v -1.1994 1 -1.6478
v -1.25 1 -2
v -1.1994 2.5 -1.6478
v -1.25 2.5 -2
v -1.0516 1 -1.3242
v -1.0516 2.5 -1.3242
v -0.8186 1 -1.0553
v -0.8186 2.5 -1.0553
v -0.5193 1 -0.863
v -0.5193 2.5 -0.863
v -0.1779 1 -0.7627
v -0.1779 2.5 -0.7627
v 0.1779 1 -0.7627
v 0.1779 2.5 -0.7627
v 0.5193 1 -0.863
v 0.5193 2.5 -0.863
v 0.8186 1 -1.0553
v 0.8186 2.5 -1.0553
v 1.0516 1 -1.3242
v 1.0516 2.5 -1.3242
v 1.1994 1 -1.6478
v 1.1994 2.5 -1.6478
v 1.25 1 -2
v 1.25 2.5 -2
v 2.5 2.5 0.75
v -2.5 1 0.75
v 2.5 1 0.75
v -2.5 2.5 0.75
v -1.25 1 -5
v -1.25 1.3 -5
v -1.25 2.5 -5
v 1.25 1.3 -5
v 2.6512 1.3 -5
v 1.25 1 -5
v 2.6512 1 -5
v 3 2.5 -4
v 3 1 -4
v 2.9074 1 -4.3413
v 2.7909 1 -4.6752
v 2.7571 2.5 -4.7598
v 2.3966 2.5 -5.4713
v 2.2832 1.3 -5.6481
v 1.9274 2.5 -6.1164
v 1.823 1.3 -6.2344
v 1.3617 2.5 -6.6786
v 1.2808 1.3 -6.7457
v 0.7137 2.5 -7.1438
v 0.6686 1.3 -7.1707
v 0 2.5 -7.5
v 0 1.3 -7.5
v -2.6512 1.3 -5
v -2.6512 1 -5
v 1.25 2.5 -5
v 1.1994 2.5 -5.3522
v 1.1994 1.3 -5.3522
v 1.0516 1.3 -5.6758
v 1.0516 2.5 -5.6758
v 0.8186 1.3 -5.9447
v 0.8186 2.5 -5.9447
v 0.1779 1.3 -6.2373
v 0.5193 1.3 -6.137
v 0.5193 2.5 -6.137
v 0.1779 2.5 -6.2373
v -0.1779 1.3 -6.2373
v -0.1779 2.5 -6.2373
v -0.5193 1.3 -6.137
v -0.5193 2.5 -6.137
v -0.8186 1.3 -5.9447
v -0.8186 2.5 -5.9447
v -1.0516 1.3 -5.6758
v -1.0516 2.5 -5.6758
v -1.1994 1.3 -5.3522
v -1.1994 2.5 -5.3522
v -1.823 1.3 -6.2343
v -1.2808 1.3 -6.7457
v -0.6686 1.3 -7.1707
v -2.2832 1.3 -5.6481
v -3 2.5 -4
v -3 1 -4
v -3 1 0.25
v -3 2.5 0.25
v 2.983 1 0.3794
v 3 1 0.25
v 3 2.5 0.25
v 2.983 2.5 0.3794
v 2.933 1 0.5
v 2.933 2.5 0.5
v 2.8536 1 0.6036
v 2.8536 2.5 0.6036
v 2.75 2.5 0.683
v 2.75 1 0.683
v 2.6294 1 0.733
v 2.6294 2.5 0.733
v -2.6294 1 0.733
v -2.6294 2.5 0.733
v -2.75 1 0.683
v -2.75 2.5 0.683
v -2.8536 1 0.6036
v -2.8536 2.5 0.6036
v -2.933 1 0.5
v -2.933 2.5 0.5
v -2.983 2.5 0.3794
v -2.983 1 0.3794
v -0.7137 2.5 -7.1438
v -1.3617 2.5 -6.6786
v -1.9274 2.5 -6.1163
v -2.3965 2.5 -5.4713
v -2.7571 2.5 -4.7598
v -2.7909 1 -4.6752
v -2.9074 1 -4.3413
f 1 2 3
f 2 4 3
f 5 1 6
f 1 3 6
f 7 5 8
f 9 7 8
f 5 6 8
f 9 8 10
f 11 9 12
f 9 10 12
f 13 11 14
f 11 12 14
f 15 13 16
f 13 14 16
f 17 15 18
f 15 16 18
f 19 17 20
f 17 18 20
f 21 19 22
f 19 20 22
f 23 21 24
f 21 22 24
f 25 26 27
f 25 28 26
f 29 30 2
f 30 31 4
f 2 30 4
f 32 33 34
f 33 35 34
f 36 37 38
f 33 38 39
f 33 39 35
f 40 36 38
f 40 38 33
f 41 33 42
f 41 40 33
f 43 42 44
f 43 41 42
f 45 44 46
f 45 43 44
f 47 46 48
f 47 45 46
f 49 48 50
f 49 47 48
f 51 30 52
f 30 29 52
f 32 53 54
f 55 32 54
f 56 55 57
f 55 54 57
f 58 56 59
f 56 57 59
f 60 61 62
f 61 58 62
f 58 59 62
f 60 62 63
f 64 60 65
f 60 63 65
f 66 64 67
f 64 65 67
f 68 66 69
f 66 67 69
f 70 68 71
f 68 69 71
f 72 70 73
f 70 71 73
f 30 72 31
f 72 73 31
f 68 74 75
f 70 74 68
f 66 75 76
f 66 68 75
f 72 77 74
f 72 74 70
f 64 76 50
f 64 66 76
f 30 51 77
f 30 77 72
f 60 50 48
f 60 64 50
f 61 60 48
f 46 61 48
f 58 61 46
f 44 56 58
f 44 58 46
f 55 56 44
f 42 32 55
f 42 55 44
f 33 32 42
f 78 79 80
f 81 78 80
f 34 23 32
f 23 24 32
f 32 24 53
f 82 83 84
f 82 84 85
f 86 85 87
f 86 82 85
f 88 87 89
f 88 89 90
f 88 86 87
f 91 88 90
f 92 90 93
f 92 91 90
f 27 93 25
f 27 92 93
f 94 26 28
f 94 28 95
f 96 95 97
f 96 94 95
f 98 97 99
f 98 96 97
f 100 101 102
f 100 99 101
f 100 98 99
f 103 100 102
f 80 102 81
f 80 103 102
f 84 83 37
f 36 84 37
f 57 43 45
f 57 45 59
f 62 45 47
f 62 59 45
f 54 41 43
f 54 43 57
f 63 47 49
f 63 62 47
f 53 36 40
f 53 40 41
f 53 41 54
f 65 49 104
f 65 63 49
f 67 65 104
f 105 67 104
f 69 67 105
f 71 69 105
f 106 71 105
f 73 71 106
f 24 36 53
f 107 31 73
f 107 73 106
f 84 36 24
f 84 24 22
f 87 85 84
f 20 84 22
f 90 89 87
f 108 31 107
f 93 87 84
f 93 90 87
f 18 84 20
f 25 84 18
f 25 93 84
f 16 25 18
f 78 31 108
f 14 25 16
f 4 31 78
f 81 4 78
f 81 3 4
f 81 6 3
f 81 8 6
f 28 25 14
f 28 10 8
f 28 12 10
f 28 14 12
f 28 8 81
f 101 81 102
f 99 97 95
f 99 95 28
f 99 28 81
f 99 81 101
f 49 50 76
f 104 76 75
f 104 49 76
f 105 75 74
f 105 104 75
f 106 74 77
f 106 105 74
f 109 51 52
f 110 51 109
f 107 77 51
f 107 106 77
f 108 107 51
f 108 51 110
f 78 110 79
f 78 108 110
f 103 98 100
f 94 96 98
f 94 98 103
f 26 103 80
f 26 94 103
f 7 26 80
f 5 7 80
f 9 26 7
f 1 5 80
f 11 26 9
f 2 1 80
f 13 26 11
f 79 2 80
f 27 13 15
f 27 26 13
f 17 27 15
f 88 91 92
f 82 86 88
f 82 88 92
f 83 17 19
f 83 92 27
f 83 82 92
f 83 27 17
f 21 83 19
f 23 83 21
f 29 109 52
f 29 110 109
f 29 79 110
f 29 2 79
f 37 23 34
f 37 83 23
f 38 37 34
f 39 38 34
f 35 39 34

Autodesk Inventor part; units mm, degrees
ref_plane "YZ Plane" through (0, 0, 0) normal (1, 0, 0) x (0, 1, 0)
ref_plane "XZ Plane" through (0, 0, 0) normal (0, 1, 0) x (-1, 0, 0)
ref_plane "XY Plane" through (0, 0, 0) normal (0, 0, 1) x (1, 0, 0)
sketch "Sketch1" plane through (0, 0, 0) normal (0, 1, 0) x (-1, 0, 0)
  line L0 (-3, -8) -> (3, -8)
  line L1 (3, -8) -> (3, 8)
  line L2 (3, 8) -> (-3, 8)
  line L3 (-3, 8) -> (-3, -8)
  line L4 (-3, -8) -> (3, 8) construction
  line L5 (3, -8) -> (-3, 8) construction
  point P0 (0, 0)
  dimension "d0" = 16
  dimension "d1" = 6
extrude "Extrusion1" add sketch "Sketch1" along normal blind 2.5
sketch "Sketch2" plane through (0, 2.5, 0) normal (0, 1, 0) x (1, 0, 0)
  line L0 (0, 5) -> (0, 2) construction
  line L1 (-1.25, 5) -> (-1.25, 2)
  line L2 (1.25, 2) -> (1.25, 5)
  arc A0 (1.25, 5) -> (-1.25, 5) centre (0, 5) ccw
  arc A1 (-1.25, 2) -> (1.25, 2) centre (0, 2) ccw
  line L3 (-3, -8) -> (3, -8) projected
  line L4 (-3, 8) -> (-3, -8) projected
  line L5 (-3, -8) -> (3, -8) projected
  line L6 (3, -8) -> (3, 8) projected
  line L7 (3, 8) -> (-3, 8) projected
  point P0 (0, 3.5)
  point P1 (0, 3.5)
  dimension "d4" = 2.5
  dimension "d7" = 6
  dimension "d8" = 3
  dimension "d9" = 3
  dimension "d28" = 3
extrude "Extrusion2" cut sketch "Sketch2" against normal through all contours A0 L2 A1 L1
sketch "Sketch3" plane through (3, 0, 8) normal (1, 0, 0) x (0, 0, -1)
  line L0 (16, 0) -> (0, 0) projected
  line L1 (16, 0) -> (2, 0)
  line L2 (2, 0) -> (2, 1)
  line L3 (2, 1) -> (16, 1)
  line L4 (16, 1) -> (16, 0)
  line L5 (0, 0) -> (0, 2.5) projected
  line L6 (0, 2.5) -> (16, 2.5) projected
  point P0 (8, 0)
  point P1 (2, 0)
  dimension "d12" = 2
  dimension "d13" = 1.5
extrude "Extrusion3" cut sketch "Sketch3" against normal through all
sketch "Sketch4" plane through (0, 2.5, 0) normal (0, 1, 0) x (1, 0, 0)
  line L0 (-3, 8) -> (-3, -8) projected
  line L1 (3, -8) -> (3, 8) projected
  arc A0 (-3, -6) -> (3, -6) centre (0, -4.75) ccw
  line L2 (-3, -8) -> (3, -8) projected
  point P0 (0, 0)
  point P1 (-2, 6)
  point P2 (2, 6)
  point P3 (3, 8)
  point P4 (0, -8)
  point P5 (-2.2361, -8)
  dimension "d17" = 2
extrude "Extrusion4" cut sketch "Sketch4" against normal through all
sketch "Sketch5" plane through (0, 2.5, 0) normal (0, 1, 0) x (1, 0, 0)
  line L0 (3, -6) -> (3, 8) projected
  line L1 (3, 8) -> (-3, 8) projected
  line L2 (-3, 8) -> (-3, -6) projected
  arc A0 (1.25, 5) -> (-1.25, 5) centre (0, 5) ccw projected
  arc A1 (3, 4) -> (0, 7.5) centre (-1.8689, 2.8624) ccw
  arc A2 (0, 7.5) -> (-3, 4) centre (1.8689, 2.8624) ccw
  point P0 (0, 0)
  point P1 (-3, 6.2041)
  point P2 (0, 6.25)
  point P3 (0, 6.25)
  dimension "d23" = 5
  dimension "d24" = 4
  dimension "d25" = 0.5
extrude "Extrusion5" cut sketch "Sketch5" against normal through all
sketch "Sketch6" plane through (-3, 1, 6) normal (0, -1, 0) x (1, 0, 0)
  line L0 (6.1469, -11) -> (-0.0299, -11)
  line L1 (-0.0299, -11) -> (-0.0299, -13.5)
  line L2 (-0.0299, -13.5) -> (6.1469, -13.5)
  line L3 (6.1469, -13.5) -> (6.1469, -11)
  arc A0 (1.75, -11) -> (4.25, -11) centre (3, -11) ccw projected
  point P0 (3, -6)
  point P1 (3, -13.5)
  point P2 (1.75, -11)
extrude "Extrusion6" cut sketch "Sketch6" against normal blind 0.3 contours L3 L2 L1 L0 A0
sketch "Sketch7" plane through (0, 2.5, 0) normal (0, 1, 0) x (1, 0, 0)
  line L0 (3, -6) -> (3, 4) projected
  line L1 (-3, 4) -> (-3, -6) projected
  line L2 (-3, -4.25) -> (3, -4.25)
  arc A0 (-1.25, 2) -> (1.25, 2) centre (0, 2) ccw projected
  arc A1 (-3, -6) -> (3, -6) centre (0, -4.75) ccw projected
  point P0 (0, 0)
  point P1 (0, 0.75)
  dimension "d29" = 5
extrude "Extrusion7" cut sketch "Sketch7" against normal through all
fillet "Fillet2" radius 2 2 edges at (3, 1.75, 4.25) (-3, 1.75, 4.25)
sketch "Sketch8" plane through (0, 2.5, 0) normal (0, 1, 0) x (1, 0, 0)
  line L0 (3, -4.25) -> (-3, -4.25)
  line L1 (-3, -4.25) -> (-3, -0.75)
  line L2 (-3, -0.75) -> (3, -0.75)
  line L3 (3, -0.75) -> (3, -4.25)
  arc A0 (-1.25, 2) -> (1.25, 2) centre (0, 2) ccw projected
  line L4 (3, -2.25) -> (3, 4) projected
  line L5 (-3, 4) -> (-3, -2.25) projected
  point P0 (0, 0)
  point P1 (1, -4.25)
  dimension "d33" = 2.75
extrude "Extrusion8" cut sketch "Sketch8" against normal through all
fillet "Fillet3" radius 0.5 2 edges at (3, 1.75, 0.75) (-3, 1.75, 0.75)
equation "\"d8\" = 0.5 * d7"
properties part number "Carrier Tab 2x2 V1"
